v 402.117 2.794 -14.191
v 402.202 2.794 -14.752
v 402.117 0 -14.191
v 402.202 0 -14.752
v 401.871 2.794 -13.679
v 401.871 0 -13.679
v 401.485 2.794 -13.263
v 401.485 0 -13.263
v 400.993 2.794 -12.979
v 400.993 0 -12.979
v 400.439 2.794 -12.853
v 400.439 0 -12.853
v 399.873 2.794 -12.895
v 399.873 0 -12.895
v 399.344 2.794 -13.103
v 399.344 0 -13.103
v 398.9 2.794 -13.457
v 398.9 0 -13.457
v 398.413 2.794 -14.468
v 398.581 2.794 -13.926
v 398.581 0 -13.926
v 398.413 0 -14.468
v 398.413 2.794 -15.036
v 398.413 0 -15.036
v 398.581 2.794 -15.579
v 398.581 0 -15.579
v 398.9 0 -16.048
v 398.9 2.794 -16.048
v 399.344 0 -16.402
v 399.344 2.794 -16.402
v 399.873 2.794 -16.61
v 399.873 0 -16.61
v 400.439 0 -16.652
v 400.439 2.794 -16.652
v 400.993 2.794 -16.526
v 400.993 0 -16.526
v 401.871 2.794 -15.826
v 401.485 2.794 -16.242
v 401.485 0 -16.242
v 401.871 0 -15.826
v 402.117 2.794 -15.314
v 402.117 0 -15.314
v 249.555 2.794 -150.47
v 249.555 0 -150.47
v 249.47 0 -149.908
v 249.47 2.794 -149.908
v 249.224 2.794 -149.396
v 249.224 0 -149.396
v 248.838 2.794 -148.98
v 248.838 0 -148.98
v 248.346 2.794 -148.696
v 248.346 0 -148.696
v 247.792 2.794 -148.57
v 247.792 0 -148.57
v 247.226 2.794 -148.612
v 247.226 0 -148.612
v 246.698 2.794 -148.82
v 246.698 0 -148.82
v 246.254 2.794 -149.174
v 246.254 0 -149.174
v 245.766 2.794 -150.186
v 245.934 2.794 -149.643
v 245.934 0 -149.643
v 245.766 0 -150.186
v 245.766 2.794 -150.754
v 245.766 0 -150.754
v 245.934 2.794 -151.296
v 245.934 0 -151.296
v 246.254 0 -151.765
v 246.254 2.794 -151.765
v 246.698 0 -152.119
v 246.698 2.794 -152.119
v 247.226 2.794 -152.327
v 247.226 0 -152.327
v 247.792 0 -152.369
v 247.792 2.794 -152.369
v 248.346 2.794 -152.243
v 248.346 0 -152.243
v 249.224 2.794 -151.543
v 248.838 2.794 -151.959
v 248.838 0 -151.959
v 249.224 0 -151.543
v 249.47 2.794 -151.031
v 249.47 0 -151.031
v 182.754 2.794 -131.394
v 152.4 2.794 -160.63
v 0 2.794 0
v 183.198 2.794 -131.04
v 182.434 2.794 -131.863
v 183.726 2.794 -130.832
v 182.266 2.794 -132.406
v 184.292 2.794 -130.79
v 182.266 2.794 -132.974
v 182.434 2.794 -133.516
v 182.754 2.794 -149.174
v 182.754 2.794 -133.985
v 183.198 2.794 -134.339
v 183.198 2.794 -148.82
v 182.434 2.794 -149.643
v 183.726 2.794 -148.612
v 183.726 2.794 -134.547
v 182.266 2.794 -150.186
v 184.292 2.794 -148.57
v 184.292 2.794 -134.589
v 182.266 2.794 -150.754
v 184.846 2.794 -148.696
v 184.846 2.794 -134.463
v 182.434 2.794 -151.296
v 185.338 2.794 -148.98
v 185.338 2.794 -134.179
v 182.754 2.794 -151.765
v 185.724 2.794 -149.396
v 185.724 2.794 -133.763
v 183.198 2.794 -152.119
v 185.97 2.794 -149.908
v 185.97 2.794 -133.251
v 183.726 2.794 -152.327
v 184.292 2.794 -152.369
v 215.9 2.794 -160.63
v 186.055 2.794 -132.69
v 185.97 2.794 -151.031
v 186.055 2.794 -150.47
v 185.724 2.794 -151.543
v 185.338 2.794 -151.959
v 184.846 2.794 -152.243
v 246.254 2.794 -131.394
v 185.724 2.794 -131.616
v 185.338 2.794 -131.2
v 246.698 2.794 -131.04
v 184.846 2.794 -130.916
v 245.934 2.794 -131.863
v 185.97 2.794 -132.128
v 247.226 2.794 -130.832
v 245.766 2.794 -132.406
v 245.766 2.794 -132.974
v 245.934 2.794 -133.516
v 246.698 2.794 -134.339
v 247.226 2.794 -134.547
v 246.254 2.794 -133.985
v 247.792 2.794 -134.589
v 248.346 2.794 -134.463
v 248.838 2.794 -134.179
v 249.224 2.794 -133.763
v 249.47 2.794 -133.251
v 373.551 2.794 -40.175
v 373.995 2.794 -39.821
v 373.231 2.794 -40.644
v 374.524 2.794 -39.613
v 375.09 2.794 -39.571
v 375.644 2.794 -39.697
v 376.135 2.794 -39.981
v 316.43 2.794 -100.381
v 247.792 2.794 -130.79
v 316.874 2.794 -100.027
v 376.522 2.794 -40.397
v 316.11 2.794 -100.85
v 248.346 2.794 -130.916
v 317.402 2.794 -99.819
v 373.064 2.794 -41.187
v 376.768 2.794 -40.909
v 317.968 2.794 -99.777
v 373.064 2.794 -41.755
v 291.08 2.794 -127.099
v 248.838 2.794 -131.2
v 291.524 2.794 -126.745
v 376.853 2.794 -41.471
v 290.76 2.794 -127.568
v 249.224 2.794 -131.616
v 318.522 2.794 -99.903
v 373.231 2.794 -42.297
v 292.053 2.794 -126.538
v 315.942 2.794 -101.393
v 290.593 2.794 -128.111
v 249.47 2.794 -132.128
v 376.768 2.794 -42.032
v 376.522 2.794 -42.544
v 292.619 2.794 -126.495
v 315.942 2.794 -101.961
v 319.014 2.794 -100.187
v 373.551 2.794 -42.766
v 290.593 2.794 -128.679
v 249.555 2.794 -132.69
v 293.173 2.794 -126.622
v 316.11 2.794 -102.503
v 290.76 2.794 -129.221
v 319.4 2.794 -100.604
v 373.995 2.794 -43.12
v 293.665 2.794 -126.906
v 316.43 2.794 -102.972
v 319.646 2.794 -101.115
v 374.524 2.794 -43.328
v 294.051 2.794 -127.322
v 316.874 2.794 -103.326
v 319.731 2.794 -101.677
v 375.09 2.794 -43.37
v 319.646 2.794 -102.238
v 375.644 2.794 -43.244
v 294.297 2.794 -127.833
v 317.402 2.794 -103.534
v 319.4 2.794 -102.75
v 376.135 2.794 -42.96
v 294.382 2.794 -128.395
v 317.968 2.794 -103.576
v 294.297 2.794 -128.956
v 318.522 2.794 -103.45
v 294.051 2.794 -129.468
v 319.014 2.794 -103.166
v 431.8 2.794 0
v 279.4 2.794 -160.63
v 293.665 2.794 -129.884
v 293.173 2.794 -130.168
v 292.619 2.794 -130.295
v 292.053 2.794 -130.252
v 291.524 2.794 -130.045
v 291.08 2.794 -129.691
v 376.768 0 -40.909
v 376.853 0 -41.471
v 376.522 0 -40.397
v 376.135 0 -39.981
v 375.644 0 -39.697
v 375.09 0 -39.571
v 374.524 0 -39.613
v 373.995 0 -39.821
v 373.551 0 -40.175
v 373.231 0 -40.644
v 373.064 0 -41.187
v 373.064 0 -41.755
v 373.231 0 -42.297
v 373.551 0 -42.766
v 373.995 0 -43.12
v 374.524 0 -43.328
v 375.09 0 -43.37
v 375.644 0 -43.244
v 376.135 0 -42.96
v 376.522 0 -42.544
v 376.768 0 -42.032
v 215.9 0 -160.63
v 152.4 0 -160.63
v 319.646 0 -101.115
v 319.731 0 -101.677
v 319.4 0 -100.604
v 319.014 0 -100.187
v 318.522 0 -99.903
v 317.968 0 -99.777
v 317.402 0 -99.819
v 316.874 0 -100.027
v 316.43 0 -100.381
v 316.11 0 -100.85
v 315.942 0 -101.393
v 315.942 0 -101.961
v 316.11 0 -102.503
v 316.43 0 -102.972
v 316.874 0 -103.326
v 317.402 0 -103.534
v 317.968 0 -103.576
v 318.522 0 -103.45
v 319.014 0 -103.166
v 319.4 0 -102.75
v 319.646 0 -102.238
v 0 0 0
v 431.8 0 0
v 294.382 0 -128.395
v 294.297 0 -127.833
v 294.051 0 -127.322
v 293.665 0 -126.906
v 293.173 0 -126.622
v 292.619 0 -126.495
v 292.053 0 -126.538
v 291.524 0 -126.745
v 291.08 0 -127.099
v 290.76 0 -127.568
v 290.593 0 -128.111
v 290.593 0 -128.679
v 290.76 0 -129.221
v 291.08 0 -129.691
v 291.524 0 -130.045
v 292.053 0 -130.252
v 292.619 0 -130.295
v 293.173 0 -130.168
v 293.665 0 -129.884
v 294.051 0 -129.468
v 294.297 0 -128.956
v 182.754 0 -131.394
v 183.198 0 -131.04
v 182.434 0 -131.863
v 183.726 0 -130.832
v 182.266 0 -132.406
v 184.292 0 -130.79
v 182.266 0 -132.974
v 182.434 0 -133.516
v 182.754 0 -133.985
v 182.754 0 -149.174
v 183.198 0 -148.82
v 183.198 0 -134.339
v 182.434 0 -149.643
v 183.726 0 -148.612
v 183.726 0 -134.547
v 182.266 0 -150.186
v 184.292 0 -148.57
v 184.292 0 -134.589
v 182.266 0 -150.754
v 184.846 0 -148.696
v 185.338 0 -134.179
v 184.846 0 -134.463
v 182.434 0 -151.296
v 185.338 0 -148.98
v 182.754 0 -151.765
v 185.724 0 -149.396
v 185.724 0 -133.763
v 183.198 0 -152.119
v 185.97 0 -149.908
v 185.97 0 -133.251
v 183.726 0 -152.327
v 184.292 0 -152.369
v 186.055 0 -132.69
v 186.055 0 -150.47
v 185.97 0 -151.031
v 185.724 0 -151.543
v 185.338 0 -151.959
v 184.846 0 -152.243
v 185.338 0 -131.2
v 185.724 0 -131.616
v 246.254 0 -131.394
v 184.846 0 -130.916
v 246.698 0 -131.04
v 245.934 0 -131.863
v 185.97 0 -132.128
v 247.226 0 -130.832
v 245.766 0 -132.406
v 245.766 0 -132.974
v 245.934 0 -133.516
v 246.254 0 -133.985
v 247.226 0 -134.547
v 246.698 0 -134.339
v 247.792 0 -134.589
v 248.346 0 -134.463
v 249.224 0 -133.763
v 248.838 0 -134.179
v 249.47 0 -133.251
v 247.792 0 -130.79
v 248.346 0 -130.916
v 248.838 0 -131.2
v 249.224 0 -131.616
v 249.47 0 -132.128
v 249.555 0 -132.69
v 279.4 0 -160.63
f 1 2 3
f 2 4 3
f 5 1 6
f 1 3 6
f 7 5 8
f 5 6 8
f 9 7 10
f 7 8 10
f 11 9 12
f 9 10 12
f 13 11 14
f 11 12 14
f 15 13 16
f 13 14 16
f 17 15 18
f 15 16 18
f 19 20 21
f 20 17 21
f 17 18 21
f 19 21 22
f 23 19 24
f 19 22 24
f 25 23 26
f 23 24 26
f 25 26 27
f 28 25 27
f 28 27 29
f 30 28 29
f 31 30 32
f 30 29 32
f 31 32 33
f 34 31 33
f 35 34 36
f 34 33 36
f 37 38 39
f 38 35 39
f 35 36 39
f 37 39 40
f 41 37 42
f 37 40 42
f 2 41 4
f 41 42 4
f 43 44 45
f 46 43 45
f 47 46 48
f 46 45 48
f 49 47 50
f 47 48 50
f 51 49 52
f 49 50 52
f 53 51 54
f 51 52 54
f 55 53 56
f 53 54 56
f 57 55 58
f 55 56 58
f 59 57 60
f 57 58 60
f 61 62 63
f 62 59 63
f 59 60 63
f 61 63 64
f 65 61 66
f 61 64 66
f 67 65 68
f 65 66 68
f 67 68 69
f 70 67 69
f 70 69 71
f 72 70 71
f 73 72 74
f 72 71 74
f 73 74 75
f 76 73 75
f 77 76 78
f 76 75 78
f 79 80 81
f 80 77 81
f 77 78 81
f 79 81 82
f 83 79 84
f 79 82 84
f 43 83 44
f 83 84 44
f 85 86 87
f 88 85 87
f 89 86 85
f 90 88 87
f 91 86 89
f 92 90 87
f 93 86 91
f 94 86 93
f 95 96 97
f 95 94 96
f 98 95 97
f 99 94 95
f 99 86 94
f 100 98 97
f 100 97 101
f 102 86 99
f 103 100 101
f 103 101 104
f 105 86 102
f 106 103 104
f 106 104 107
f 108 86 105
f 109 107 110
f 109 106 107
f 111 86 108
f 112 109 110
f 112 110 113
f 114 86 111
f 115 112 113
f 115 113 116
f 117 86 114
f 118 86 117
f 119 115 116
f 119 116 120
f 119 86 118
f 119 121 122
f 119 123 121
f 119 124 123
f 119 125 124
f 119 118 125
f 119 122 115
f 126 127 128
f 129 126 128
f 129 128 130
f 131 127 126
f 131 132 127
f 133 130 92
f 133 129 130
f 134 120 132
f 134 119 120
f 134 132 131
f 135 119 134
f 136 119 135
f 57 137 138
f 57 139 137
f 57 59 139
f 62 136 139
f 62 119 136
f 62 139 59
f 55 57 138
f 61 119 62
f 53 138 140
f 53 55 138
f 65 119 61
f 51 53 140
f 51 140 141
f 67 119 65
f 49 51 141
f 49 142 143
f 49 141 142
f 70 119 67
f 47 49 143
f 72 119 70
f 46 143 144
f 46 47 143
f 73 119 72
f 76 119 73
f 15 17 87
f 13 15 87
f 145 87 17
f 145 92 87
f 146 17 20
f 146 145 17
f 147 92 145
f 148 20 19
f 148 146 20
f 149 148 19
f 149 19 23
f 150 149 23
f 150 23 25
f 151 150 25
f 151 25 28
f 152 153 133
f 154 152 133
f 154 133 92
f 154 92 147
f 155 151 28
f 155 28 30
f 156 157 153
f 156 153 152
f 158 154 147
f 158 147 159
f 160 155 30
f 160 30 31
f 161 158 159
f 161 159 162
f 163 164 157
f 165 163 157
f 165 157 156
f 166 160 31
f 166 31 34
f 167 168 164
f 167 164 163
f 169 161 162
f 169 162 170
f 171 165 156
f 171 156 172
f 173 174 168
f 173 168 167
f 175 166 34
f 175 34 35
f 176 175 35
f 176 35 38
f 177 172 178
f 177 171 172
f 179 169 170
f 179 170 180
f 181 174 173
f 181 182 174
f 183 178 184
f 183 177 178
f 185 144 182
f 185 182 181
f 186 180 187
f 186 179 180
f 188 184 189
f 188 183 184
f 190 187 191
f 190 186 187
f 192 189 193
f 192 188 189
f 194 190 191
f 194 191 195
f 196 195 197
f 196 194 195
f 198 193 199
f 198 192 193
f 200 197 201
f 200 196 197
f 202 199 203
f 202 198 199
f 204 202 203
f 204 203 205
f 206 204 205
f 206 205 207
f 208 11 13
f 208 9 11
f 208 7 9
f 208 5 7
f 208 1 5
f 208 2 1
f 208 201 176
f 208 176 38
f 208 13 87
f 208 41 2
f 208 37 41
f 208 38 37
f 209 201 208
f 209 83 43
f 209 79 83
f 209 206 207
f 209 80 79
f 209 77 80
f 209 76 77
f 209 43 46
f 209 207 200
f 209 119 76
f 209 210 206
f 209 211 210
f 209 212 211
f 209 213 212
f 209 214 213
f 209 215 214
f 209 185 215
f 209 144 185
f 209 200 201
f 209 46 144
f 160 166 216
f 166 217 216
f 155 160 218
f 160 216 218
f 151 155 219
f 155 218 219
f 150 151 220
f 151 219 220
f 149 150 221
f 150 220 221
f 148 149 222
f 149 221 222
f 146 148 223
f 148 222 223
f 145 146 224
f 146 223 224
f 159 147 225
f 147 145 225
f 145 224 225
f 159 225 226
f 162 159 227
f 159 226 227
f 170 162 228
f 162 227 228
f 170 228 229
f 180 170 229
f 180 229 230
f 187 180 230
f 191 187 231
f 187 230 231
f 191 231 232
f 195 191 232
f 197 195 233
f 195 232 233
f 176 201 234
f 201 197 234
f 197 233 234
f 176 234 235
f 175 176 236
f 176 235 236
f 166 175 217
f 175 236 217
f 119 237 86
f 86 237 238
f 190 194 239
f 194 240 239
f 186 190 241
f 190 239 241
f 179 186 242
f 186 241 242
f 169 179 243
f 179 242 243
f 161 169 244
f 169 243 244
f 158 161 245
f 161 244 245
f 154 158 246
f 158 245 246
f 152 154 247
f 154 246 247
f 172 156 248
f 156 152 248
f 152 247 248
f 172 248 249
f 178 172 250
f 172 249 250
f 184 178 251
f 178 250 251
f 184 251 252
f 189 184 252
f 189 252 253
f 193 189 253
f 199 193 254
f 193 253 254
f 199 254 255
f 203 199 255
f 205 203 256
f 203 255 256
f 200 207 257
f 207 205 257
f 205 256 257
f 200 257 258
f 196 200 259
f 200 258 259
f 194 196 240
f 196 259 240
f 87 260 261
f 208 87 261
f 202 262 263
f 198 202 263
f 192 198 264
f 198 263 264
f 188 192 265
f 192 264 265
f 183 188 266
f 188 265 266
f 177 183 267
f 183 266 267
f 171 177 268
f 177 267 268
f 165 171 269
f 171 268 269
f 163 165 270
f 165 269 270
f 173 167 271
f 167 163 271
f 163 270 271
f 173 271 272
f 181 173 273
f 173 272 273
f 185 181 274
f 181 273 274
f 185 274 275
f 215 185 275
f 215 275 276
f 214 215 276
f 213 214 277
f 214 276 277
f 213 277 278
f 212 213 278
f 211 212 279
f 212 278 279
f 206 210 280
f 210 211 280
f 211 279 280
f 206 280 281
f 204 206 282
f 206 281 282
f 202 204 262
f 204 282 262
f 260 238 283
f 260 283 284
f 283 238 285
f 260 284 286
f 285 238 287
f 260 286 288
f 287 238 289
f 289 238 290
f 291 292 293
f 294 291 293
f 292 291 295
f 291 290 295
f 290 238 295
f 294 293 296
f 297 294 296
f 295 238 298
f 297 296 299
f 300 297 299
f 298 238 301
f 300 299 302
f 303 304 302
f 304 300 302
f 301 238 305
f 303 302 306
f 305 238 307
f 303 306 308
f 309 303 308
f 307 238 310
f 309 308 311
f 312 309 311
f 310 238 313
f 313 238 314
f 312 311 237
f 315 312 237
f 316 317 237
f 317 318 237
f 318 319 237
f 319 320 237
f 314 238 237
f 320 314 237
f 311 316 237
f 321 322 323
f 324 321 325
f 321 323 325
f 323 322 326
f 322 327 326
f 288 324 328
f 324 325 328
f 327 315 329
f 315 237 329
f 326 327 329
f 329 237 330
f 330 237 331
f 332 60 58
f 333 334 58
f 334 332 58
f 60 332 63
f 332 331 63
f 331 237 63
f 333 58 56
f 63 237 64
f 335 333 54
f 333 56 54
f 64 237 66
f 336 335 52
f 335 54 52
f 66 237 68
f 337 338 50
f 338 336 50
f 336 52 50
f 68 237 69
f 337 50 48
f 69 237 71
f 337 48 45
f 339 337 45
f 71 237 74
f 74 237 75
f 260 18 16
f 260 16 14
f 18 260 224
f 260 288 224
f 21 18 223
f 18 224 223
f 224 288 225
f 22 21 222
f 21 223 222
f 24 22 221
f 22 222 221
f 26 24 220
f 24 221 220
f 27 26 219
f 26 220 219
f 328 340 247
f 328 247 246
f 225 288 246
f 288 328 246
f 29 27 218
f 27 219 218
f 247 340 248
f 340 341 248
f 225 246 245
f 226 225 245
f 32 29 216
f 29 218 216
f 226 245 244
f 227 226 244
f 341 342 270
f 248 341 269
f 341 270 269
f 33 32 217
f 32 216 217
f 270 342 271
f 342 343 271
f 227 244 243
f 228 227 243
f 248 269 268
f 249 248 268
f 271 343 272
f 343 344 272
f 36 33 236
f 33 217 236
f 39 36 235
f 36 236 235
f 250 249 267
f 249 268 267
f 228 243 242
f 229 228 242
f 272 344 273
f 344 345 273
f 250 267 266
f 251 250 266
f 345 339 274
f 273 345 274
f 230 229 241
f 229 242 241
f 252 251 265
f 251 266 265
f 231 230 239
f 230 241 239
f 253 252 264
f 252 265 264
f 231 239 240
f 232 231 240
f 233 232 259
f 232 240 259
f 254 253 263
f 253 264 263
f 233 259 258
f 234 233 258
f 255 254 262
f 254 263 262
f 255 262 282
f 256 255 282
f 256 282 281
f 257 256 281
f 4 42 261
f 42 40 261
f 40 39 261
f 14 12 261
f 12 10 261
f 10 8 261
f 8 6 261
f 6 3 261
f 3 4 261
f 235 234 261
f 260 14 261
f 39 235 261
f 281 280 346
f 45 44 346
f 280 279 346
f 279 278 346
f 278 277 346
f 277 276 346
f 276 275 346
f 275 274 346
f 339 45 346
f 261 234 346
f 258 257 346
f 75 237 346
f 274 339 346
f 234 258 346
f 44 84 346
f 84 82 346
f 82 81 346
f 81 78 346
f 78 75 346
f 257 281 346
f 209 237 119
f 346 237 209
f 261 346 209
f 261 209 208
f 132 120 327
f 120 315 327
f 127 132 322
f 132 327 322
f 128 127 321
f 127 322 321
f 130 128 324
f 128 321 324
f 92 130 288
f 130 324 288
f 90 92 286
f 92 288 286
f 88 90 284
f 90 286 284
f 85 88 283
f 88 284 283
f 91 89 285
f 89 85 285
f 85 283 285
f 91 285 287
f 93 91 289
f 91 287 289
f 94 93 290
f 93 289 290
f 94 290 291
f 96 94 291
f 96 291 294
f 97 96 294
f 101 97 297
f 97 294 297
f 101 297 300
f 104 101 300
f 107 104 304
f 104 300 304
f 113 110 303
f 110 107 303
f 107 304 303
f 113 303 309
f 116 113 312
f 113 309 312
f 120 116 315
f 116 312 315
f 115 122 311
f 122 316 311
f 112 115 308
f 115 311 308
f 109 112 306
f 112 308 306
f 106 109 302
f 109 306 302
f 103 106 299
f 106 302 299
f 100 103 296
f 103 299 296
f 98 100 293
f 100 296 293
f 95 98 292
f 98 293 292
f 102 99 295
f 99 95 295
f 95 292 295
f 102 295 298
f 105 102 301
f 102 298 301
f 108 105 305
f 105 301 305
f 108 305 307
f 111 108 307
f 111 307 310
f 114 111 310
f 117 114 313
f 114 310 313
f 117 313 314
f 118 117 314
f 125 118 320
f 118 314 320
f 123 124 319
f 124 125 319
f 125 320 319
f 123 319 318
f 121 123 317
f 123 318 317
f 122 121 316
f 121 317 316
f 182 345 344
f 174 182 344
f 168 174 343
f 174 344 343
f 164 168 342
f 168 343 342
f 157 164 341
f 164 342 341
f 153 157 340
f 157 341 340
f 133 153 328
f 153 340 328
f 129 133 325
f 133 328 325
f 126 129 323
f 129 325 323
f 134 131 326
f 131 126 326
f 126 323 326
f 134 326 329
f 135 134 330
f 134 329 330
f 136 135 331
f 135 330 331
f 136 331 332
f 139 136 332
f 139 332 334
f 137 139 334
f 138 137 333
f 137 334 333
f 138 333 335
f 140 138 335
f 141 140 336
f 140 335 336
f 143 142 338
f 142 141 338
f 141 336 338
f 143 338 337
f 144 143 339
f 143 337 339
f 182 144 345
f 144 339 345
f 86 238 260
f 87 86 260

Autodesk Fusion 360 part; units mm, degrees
sketch "Sketch1" plane through (0, 0, 0) normal (0, 1, 0) x (1, 0, 0)
  line L0 (0, 0) -> (431.8, 0)
  line L1 (215.9, 160.6296) -> (152.4, 160.6296)
  line L2 (215.9, 160.6296) -> (279.4, 160.6296)
  line L3 (279.4, 160.6296) -> (431.8, 0)
  line L4 (152.4, 160.6296) -> (0, 0)
  circle A0 centre (247.65, 132.6896) radius 1.905
  circle A1 centre (184.15, 150.4696) radius 1.905
  circle A2 centre (317.8261, 101.6767) radius 1.905
  circle A3 centre (374.9476, 41.4706) radius 1.905
  circle A4 centre (247.65, 150.4696) radius 1.905
  circle A5 centre (184.15, 132.6896) radius 1.905
  circle A6 centre (292.4768, 128.3949) radius 1.905
  circle A7 centre (400.2969, 14.7524) radius 1.905
  dimension "d1" = 431.8
  dimension "d3" = 63.5
  dimension "d4" = 63.5
extrude "Extrude3" add sketch "Sketch1" along normal blind 2.794
